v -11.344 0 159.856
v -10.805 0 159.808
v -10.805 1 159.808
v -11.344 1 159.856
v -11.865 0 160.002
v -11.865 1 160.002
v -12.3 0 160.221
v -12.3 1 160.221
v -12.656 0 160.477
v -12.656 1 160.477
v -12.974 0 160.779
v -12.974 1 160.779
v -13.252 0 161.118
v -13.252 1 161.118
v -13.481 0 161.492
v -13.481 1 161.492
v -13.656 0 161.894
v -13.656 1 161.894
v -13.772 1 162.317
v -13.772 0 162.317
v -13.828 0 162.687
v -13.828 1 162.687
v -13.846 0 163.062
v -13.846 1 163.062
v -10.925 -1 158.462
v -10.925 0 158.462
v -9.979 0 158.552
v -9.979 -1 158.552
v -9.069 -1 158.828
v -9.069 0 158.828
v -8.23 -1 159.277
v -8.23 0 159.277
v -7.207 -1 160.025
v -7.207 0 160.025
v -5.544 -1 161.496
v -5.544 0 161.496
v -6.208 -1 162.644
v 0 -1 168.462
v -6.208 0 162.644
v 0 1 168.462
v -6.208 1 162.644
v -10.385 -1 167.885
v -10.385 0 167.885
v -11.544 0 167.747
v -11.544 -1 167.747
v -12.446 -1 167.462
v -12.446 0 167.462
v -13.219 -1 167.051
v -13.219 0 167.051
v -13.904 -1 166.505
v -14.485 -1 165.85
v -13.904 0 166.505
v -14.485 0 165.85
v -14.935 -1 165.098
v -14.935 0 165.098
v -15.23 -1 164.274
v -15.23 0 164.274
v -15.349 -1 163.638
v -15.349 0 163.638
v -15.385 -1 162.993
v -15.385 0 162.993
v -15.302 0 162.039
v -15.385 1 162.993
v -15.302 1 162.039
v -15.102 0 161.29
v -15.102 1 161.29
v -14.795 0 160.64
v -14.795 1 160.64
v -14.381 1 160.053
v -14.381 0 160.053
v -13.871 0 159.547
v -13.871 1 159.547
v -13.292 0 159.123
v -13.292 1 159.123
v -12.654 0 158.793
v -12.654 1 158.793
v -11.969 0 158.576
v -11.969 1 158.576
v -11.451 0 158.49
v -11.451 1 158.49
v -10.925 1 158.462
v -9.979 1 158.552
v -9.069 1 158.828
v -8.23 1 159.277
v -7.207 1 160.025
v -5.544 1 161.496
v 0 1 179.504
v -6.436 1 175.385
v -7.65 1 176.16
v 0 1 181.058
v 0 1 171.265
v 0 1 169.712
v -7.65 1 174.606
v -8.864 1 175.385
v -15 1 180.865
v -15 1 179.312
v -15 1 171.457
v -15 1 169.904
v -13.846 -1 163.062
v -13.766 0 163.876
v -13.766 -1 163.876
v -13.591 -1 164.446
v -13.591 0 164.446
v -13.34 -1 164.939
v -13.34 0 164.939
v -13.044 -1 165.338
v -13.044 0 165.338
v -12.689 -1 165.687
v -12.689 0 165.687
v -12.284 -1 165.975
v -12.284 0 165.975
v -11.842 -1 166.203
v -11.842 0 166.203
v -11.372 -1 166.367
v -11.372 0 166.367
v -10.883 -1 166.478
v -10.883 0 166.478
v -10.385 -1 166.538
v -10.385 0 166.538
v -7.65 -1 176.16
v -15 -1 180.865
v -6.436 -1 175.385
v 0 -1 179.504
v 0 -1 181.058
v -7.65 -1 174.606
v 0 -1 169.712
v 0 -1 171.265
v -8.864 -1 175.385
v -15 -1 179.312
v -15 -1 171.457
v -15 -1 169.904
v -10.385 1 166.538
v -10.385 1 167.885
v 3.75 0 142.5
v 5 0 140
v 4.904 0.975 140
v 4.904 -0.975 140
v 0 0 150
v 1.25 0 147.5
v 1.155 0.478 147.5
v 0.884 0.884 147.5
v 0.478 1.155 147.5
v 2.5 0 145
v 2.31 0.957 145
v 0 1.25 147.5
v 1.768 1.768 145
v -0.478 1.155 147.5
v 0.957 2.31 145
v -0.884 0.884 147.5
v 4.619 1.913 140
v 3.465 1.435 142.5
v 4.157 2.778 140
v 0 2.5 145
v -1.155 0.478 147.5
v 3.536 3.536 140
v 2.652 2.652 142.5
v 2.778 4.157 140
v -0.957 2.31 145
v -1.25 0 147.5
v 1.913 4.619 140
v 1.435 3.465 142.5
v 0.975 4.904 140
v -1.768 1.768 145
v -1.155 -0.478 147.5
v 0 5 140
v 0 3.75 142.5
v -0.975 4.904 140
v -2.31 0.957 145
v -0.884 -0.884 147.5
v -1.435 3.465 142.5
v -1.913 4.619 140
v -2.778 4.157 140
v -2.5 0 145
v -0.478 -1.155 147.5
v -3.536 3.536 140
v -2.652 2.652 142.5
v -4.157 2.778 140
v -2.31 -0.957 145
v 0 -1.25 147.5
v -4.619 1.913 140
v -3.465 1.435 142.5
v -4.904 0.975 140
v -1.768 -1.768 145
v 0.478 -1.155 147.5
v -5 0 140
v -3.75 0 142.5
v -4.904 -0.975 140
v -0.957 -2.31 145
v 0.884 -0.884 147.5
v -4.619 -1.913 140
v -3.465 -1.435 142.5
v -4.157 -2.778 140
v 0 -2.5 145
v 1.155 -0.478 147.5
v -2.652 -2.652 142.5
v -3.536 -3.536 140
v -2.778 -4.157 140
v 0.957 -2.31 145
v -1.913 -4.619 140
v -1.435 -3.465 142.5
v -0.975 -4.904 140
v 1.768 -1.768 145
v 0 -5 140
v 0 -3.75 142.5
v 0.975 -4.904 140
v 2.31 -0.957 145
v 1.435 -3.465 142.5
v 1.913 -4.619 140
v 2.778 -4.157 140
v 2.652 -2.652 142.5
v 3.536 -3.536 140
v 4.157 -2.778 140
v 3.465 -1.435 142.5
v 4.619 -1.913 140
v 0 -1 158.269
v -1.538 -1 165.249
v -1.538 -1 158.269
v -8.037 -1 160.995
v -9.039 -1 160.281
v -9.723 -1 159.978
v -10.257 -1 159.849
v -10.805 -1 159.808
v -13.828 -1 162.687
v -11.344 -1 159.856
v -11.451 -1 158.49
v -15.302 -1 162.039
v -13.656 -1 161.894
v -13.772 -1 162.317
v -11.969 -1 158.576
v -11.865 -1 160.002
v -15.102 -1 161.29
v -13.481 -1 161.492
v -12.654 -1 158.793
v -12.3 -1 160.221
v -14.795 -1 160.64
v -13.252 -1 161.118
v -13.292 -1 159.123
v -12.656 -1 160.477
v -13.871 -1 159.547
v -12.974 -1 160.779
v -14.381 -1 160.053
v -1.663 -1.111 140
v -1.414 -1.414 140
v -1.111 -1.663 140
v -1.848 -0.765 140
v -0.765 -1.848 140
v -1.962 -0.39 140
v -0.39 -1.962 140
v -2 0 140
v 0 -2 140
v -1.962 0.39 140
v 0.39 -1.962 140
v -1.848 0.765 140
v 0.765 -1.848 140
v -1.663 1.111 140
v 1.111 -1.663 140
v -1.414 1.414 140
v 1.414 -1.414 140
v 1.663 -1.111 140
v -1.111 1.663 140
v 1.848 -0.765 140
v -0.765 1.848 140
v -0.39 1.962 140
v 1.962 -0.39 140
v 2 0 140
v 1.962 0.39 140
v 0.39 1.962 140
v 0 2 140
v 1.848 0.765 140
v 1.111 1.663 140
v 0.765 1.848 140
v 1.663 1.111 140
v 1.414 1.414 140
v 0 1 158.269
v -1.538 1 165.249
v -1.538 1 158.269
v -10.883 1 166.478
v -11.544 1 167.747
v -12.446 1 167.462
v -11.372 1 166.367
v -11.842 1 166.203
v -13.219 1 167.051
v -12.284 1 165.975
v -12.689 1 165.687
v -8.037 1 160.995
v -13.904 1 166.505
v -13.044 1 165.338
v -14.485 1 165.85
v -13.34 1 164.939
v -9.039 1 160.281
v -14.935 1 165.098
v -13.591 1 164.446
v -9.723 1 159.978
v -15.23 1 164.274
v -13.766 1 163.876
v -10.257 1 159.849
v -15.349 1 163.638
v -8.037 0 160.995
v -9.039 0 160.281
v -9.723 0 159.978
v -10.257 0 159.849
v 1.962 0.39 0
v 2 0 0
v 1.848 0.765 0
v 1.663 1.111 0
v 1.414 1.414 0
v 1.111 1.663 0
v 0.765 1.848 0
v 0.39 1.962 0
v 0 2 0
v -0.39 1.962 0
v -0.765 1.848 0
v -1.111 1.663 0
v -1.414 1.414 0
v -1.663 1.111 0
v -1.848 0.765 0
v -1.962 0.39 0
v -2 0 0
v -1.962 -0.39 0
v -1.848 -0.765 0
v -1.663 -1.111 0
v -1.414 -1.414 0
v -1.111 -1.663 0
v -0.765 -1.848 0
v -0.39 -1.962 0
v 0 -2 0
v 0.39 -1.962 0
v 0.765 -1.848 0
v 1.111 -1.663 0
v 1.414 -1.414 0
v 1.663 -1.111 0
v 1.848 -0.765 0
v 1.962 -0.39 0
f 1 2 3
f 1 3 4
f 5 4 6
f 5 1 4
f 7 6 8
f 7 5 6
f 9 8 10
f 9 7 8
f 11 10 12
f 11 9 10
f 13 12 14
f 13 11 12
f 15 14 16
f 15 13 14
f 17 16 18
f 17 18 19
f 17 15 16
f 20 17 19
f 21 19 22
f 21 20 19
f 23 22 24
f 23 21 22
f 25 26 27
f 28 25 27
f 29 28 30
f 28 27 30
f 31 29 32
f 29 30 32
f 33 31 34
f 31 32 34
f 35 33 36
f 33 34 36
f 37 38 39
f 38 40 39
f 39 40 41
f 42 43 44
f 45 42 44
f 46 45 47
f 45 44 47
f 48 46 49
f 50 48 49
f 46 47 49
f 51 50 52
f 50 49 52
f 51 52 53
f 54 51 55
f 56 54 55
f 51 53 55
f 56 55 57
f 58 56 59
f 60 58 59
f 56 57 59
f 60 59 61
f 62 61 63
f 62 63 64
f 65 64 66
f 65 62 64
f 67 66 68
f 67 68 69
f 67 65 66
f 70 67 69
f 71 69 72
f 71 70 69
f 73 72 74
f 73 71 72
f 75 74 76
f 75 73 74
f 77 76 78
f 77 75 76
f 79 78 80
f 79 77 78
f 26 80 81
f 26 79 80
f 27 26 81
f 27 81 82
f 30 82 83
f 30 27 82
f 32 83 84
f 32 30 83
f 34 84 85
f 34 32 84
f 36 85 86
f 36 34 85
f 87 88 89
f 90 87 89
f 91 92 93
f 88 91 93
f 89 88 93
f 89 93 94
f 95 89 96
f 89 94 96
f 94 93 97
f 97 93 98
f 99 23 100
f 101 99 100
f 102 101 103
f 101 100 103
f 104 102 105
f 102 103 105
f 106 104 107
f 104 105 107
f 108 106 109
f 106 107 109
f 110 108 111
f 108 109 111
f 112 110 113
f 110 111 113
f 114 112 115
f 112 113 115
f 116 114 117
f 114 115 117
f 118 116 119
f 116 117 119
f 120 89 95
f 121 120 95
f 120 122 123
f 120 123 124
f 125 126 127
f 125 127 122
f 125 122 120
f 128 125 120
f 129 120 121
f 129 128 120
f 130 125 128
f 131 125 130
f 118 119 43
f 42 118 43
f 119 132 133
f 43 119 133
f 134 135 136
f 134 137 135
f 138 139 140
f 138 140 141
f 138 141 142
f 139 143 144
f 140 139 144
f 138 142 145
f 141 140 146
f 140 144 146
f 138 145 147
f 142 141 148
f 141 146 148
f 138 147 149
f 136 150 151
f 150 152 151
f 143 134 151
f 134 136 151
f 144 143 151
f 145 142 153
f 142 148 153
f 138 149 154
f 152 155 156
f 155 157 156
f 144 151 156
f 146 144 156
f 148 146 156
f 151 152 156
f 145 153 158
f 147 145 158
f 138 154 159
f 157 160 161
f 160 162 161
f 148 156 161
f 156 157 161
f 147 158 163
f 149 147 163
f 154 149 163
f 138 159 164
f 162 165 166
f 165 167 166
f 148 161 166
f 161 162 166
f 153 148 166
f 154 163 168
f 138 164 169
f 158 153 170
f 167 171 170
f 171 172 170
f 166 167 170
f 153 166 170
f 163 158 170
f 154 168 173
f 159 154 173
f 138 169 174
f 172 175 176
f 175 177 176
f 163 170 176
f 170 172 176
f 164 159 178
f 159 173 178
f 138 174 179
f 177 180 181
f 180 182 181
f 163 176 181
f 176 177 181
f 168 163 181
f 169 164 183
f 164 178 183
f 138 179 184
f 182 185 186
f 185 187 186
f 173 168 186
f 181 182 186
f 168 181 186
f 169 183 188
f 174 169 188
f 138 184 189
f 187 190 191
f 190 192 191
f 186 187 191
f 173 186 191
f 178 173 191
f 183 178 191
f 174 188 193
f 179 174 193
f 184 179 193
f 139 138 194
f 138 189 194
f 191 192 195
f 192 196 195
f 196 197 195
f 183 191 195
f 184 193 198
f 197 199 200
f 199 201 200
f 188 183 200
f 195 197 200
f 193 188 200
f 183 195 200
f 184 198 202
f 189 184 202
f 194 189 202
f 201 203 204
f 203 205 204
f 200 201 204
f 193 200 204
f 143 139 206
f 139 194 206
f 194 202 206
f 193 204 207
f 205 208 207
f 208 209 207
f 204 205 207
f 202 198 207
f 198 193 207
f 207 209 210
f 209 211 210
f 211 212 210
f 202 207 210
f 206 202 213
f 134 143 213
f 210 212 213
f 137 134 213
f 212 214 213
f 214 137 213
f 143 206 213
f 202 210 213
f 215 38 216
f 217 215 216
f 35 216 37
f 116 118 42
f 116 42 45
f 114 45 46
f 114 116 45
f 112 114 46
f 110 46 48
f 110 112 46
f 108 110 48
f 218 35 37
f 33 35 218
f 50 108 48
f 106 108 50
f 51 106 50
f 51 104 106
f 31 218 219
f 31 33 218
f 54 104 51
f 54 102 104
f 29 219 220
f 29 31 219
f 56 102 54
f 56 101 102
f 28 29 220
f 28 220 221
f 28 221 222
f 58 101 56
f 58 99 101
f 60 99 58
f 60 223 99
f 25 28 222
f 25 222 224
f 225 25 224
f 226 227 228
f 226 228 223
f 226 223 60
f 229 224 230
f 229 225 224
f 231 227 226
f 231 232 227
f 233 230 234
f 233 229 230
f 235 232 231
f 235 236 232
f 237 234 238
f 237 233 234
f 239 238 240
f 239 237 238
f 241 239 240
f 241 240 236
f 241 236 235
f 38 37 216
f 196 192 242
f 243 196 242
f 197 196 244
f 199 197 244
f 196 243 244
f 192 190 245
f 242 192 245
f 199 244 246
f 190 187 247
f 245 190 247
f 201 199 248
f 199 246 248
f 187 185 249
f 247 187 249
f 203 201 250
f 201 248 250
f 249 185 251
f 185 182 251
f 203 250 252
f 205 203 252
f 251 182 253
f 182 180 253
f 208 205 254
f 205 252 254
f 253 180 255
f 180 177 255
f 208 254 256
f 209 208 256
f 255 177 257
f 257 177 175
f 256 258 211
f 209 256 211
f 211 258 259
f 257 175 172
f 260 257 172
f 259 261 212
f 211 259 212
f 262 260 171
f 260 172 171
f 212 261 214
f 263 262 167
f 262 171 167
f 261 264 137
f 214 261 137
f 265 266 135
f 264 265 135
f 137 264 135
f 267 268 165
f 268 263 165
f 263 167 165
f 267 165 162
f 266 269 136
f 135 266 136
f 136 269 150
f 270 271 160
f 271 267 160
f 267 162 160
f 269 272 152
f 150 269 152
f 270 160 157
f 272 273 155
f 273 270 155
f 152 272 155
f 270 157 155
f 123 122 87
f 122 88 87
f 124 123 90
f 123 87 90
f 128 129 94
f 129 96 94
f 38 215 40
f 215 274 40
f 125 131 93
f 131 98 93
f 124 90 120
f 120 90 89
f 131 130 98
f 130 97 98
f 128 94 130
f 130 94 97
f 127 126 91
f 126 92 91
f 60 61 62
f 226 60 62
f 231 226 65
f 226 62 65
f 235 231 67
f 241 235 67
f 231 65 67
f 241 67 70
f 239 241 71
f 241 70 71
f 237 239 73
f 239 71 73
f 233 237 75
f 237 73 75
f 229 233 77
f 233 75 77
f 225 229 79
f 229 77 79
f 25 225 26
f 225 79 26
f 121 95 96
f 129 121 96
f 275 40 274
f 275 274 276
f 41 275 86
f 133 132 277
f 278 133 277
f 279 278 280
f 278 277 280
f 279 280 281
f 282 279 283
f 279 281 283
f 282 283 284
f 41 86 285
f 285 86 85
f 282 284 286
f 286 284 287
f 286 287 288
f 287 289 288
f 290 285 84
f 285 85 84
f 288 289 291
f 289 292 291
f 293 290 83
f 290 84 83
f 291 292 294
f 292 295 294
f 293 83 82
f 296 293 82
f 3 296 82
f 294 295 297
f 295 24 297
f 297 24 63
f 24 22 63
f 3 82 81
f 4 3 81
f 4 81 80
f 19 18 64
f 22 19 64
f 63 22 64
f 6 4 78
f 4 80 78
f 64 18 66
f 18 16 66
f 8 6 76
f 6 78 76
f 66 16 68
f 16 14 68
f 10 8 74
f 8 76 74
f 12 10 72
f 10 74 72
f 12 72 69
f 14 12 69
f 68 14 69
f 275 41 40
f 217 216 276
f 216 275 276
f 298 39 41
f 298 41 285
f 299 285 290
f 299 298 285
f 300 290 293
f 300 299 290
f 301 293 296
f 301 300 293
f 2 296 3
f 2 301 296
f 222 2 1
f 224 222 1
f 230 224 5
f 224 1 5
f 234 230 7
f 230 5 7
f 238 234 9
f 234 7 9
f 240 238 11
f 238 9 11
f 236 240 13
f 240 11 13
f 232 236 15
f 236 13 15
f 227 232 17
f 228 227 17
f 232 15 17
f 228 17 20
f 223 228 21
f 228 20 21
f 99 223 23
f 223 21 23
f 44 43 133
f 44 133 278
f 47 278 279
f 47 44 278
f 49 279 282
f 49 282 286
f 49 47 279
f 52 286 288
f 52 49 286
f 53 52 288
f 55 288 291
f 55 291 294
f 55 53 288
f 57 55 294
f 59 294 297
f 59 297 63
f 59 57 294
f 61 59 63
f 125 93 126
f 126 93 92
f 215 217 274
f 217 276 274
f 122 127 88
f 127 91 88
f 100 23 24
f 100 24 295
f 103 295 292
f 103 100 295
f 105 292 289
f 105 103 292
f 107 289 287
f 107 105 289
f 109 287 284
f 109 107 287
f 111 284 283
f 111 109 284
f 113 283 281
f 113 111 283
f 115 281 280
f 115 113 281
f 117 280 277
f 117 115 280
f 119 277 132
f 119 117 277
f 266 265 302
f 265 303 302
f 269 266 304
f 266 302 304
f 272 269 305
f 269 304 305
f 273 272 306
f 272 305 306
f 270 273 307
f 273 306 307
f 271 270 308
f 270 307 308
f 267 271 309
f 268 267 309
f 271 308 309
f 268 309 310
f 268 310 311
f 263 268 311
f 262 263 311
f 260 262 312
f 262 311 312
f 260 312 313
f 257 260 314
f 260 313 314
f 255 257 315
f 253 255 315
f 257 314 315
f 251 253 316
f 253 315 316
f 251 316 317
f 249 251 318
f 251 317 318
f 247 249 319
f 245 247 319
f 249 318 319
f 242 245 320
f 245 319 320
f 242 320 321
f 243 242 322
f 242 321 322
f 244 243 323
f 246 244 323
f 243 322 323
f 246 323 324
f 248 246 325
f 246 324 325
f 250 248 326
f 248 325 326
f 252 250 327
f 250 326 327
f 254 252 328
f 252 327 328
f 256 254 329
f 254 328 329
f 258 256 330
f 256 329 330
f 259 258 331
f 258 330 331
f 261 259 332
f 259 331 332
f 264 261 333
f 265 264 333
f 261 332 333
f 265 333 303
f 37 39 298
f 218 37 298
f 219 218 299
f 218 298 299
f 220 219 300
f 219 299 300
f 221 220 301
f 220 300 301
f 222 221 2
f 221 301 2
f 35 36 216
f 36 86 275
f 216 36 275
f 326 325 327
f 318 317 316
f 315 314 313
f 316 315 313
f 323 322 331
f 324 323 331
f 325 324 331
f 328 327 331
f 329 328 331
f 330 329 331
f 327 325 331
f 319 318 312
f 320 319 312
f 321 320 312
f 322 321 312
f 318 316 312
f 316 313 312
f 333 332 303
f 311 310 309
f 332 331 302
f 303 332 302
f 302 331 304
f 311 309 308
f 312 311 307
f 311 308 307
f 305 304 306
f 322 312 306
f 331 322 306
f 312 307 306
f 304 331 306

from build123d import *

# Parameters (mm, degrees)
BOSS_EXTRUDE1_DEPTH        = 1
BOSS_EXTRUDE1_DEPTH_BACK   = 1
BOSS_EXTRUDE1_2_DEPTH      = 1
BOSS_EXTRUDE1_2_DEPTH_BACK = 1


with BuildPart() as part:
    # Sketch2 → Revolve1 (revolve)
    with BuildSketch(Plane(origin=(0, 0, 0), x_dir=(1, 0, 0), z_dir=(0, 1, 0))):
        Polygon((0, -150), (5, -140), (2, -140), (2, 0), (0, 0), align=None)
    revolve(axis=Axis((0, 0, -41.949952025), (0, 0, 1)))


with BuildPart() as body_2:
    # Sketch3 → Boss-Extrude1 (new, two sides: drawn at the far end of the back side and taken through both)
    with BuildSketch(Plane(origin=(0, 0, 0), x_dir=(1, 0, 0), z_dir=(0, 1, 0)).offset(-BOSS_EXTRUDE1_DEPTH_BACK)):
        with BuildLine():
            Line((-10.384615385, -166.538461538), (-10.384615385, -167.884615385))
            add(Edge.make_bspline(
                [(-10.384615385, -167.884615385), (-10.563204904, -167.875841872), (-10.913949966, -167.858610926), (-11.425338136, -167.777918258), (-11.914144417, -167.662457355), (-12.376444048, -167.499208267), (-12.81632465, -167.296467076), (-13.232039003, -167.053338387), (-13.622001241, -166.765364742), (-13.982596283, -166.438764454), (-14.313400158, -166.084041715), (-14.599065485, -165.701301974), (-14.840426933, -165.299109), (-15.042203684, -164.878683005), (-15.193660166, -164.435280589), (-15.306038622, -163.972925484), (-15.373651532, -163.489586328), (-15.380919185, -163.160271948), (-15.384615385, -162.992788462)],
                knots=[0, 0, 0, 0, 1.10065271, 2.161652631, 3.183658789, 4.190468796, 5.17591951, 6.163126047, 7.15150782, 8.156236427, 9.156009102, 10.134482811, 11.092018607, 12.041330605, 13.001268258, 13.972401359, 14.968799086, 16, 16, 16, 16], degree=3))
            add(Edge.make_bspline(
                [(-15.384615385, -162.992788462), (-15.380796104, -162.828299426), (-15.373291355, -162.505084348), (-15.307873473, -162.033553745), (-15.207626401, -161.583600463), (-15.059076032, -161.160323818), (-14.872677813, -160.759379802), (-14.640867206, -160.385732767), (-14.37461271, -160.030347538), (-14.060552476, -159.710665804), (-13.725449413, -159.416999565), (-13.367562158, -159.163877022), (-12.997495718, -158.945885897), (-12.612359334, -158.76746697), (-12.210898815, -158.632217489), (-11.7969631, -158.532010585), (-11.365775091, -158.474726904), (-11.073881456, -158.465983611), (-10.925480769, -158.461538462)],
                knots=[0, 0, 0, 0, 1.111674182, 2.184400057, 3.212814286, 4.223731311, 5.211378316, 6.196328225, 7.191884489, 8.207283132, 9.220262353, 10.201199469, 11.166417575, 12.120932471, 13.06540007, 14.026332106, 14.996573967, 16, 16, 16, 16], degree=3))
            add(Edge.make_bspline(
                [(-10.925480769, -158.461538462), (-10.716561568, -158.468795416), (-10.302389402, -158.483181977), (-9.693752958, -158.606241919), (-9.104071894, -158.798447615), (-8.629467281, -159.02984435), (-8.247074226, -159.263343584), (-7.93207523, -159.47354984), (-7.592995253, -159.721030517), (-7.228461871, -160.003671248), (-6.843248958, -160.326339507), (-6.429497135, -160.680652418), (-5.994856958, -161.075760232), (-5.697798463, -161.352825797), (-5.543870192, -161.496394231)],
                knots=[0, 0, 0, 0, 1.184416499, 2.348048165, 3.509039915, 4.696071444, 5.333504901, 6.05069495, 6.844171097, 7.714965912, 8.667477798, 9.695072654, 10.805644396, 12, 12, 12, 12], degree=3))
            Line((-5.543870192, -161.496394231), (-1.538461538, -165.249399038))
            Line((-1.538461538, -165.249399038), (-1.538461538, -158.269230769))
            Line((-1.538461538, -158.269230769), (0, -158.269230769))
            Line((0, -158.269230769), (0, -168.461538462))
            Line((0, -168.461538462), (-6.207932692, -162.644230769))
            add(Edge.make_bspline(
                [(-6.207932692, -162.644230769), (-6.355782578, -162.502596969), (-6.639771949, -162.230547424), (-7.054384635, -161.845764952), (-7.439025524, -161.500169288), (-7.792967874, -161.191523319), (-8.121388879, -160.926522581), (-8.413651895, -160.691355873), (-8.682599539, -160.502931912), (-8.994345027, -160.298437359), (-9.374969243, -160.100377438), (-9.840113626, -159.930181627), (-10.318944709, -159.826403705), (-10.642524868, -159.81395441), (-10.805288462, -159.807692308)],
                knots=[0, 0, 0, 0, 1.329631726, 2.553950428, 3.673215718, 4.687767853, 5.603093632, 6.413772471, 7.123043292, 7.734684054, 8.834405432, 9.900288307, 10.943827018, 12, 12, 12, 12], degree=3))
            add(Edge.make_bspline(
                [(-10.805288462, -159.807692308), (-10.907637312, -159.810416918), (-11.109347242, -159.8157866), (-11.405086209, -159.863176732), (-11.690363983, -159.934793187), (-11.966058065, -160.037415722), (-12.229396573, -160.172873179), (-12.48070006, -160.337759093), (-12.723652768, -160.528002222), (-12.951452617, -160.748079091), (-13.160086355, -160.989842747), (-13.344903864, -161.245246674), (-13.499357196, -161.515461406), (-13.625972184, -161.799347644), (-13.725295246, -162.096113942), (-13.794117729, -162.406334278), (-13.837328375, -162.72915149), (-13.843174826, -162.949580758), (-13.846153846, -163.061899038)],
                knots=[0, 0, 0, 0, 0.991446411, 1.95395049, 2.89581595, 3.838931463, 4.798493298, 5.75982156, 6.748411868, 7.785213223, 8.824556874, 9.840280684, 10.836137867, 11.835679398, 12.848801643, 13.863922112, 14.911575587, 16, 16, 16, 16], degree=3))
            add(Edge.make_bspline(
                [(-13.846153846, -163.061899038), (-13.843210339, -163.17923205), (-13.837429778, -163.409654711), (-13.793644926, -163.747248098), (-13.727267069, -164.07152127), (-13.621844545, -164.377635783), (-13.497282594, -164.672220352), (-13.339040059, -164.948986061), (-13.155158717, -165.21252807), (-12.941940801, -165.458511623), (-12.702375061, -165.683172895), (-12.438357077, -165.883342841), (-12.151787569, -166.057090331), (-11.843842673, -166.208895124), (-11.511456406, -166.332119496), (-11.155884194, -166.426294196), (-10.778648675, -166.500808117), (-10.518141312, -166.525701936), (-10.384615385, -166.538461538)],
                knots=[0, 0, 0, 0, 1.030878251, 2.024474673, 2.987898669, 3.934362936, 4.864849709, 5.795128259, 6.730474222, 7.685293701, 8.650606017, 9.611896181, 10.591709709, 11.591680886, 12.625074257, 13.701333388, 14.821793024, 16, 16, 16, 16], degree=3))
        make_face()
    extrude(amount=BOSS_EXTRUDE1_DEPTH + BOSS_EXTRUDE1_DEPTH_BACK)


with BuildPart() as body_3:
    # Sketch3 → Boss-Extrude1 2 (new, two sides: drawn at the far end of the back side and taken through both)
    with BuildSketch(Plane(origin=(0, 0, 0), x_dir=(1, 0, 0), z_dir=(0, 1, 0)).offset(-BOSS_EXTRUDE1_2_DEPTH_BACK)):
        Polygon((-15, -180.865384615), (-15, -179.311899038), (-8.864182692, -175.384615385), (-15, -171.457331731), (-15, -169.903846154), (-7.650240385, -174.606370192), (0, -169.711538462), (0, -171.265024038), (-6.436298077, -175.384615385), (0, -179.504206731), (0, -181.057692308), (-7.650240385, -176.159855769), align=None)
    extrude(amount=BOSS_EXTRUDE1_2_DEPTH + BOSS_EXTRUDE1_2_DEPTH_BACK)


solid = Compound([part.part, body_2.part, body_3.part])
